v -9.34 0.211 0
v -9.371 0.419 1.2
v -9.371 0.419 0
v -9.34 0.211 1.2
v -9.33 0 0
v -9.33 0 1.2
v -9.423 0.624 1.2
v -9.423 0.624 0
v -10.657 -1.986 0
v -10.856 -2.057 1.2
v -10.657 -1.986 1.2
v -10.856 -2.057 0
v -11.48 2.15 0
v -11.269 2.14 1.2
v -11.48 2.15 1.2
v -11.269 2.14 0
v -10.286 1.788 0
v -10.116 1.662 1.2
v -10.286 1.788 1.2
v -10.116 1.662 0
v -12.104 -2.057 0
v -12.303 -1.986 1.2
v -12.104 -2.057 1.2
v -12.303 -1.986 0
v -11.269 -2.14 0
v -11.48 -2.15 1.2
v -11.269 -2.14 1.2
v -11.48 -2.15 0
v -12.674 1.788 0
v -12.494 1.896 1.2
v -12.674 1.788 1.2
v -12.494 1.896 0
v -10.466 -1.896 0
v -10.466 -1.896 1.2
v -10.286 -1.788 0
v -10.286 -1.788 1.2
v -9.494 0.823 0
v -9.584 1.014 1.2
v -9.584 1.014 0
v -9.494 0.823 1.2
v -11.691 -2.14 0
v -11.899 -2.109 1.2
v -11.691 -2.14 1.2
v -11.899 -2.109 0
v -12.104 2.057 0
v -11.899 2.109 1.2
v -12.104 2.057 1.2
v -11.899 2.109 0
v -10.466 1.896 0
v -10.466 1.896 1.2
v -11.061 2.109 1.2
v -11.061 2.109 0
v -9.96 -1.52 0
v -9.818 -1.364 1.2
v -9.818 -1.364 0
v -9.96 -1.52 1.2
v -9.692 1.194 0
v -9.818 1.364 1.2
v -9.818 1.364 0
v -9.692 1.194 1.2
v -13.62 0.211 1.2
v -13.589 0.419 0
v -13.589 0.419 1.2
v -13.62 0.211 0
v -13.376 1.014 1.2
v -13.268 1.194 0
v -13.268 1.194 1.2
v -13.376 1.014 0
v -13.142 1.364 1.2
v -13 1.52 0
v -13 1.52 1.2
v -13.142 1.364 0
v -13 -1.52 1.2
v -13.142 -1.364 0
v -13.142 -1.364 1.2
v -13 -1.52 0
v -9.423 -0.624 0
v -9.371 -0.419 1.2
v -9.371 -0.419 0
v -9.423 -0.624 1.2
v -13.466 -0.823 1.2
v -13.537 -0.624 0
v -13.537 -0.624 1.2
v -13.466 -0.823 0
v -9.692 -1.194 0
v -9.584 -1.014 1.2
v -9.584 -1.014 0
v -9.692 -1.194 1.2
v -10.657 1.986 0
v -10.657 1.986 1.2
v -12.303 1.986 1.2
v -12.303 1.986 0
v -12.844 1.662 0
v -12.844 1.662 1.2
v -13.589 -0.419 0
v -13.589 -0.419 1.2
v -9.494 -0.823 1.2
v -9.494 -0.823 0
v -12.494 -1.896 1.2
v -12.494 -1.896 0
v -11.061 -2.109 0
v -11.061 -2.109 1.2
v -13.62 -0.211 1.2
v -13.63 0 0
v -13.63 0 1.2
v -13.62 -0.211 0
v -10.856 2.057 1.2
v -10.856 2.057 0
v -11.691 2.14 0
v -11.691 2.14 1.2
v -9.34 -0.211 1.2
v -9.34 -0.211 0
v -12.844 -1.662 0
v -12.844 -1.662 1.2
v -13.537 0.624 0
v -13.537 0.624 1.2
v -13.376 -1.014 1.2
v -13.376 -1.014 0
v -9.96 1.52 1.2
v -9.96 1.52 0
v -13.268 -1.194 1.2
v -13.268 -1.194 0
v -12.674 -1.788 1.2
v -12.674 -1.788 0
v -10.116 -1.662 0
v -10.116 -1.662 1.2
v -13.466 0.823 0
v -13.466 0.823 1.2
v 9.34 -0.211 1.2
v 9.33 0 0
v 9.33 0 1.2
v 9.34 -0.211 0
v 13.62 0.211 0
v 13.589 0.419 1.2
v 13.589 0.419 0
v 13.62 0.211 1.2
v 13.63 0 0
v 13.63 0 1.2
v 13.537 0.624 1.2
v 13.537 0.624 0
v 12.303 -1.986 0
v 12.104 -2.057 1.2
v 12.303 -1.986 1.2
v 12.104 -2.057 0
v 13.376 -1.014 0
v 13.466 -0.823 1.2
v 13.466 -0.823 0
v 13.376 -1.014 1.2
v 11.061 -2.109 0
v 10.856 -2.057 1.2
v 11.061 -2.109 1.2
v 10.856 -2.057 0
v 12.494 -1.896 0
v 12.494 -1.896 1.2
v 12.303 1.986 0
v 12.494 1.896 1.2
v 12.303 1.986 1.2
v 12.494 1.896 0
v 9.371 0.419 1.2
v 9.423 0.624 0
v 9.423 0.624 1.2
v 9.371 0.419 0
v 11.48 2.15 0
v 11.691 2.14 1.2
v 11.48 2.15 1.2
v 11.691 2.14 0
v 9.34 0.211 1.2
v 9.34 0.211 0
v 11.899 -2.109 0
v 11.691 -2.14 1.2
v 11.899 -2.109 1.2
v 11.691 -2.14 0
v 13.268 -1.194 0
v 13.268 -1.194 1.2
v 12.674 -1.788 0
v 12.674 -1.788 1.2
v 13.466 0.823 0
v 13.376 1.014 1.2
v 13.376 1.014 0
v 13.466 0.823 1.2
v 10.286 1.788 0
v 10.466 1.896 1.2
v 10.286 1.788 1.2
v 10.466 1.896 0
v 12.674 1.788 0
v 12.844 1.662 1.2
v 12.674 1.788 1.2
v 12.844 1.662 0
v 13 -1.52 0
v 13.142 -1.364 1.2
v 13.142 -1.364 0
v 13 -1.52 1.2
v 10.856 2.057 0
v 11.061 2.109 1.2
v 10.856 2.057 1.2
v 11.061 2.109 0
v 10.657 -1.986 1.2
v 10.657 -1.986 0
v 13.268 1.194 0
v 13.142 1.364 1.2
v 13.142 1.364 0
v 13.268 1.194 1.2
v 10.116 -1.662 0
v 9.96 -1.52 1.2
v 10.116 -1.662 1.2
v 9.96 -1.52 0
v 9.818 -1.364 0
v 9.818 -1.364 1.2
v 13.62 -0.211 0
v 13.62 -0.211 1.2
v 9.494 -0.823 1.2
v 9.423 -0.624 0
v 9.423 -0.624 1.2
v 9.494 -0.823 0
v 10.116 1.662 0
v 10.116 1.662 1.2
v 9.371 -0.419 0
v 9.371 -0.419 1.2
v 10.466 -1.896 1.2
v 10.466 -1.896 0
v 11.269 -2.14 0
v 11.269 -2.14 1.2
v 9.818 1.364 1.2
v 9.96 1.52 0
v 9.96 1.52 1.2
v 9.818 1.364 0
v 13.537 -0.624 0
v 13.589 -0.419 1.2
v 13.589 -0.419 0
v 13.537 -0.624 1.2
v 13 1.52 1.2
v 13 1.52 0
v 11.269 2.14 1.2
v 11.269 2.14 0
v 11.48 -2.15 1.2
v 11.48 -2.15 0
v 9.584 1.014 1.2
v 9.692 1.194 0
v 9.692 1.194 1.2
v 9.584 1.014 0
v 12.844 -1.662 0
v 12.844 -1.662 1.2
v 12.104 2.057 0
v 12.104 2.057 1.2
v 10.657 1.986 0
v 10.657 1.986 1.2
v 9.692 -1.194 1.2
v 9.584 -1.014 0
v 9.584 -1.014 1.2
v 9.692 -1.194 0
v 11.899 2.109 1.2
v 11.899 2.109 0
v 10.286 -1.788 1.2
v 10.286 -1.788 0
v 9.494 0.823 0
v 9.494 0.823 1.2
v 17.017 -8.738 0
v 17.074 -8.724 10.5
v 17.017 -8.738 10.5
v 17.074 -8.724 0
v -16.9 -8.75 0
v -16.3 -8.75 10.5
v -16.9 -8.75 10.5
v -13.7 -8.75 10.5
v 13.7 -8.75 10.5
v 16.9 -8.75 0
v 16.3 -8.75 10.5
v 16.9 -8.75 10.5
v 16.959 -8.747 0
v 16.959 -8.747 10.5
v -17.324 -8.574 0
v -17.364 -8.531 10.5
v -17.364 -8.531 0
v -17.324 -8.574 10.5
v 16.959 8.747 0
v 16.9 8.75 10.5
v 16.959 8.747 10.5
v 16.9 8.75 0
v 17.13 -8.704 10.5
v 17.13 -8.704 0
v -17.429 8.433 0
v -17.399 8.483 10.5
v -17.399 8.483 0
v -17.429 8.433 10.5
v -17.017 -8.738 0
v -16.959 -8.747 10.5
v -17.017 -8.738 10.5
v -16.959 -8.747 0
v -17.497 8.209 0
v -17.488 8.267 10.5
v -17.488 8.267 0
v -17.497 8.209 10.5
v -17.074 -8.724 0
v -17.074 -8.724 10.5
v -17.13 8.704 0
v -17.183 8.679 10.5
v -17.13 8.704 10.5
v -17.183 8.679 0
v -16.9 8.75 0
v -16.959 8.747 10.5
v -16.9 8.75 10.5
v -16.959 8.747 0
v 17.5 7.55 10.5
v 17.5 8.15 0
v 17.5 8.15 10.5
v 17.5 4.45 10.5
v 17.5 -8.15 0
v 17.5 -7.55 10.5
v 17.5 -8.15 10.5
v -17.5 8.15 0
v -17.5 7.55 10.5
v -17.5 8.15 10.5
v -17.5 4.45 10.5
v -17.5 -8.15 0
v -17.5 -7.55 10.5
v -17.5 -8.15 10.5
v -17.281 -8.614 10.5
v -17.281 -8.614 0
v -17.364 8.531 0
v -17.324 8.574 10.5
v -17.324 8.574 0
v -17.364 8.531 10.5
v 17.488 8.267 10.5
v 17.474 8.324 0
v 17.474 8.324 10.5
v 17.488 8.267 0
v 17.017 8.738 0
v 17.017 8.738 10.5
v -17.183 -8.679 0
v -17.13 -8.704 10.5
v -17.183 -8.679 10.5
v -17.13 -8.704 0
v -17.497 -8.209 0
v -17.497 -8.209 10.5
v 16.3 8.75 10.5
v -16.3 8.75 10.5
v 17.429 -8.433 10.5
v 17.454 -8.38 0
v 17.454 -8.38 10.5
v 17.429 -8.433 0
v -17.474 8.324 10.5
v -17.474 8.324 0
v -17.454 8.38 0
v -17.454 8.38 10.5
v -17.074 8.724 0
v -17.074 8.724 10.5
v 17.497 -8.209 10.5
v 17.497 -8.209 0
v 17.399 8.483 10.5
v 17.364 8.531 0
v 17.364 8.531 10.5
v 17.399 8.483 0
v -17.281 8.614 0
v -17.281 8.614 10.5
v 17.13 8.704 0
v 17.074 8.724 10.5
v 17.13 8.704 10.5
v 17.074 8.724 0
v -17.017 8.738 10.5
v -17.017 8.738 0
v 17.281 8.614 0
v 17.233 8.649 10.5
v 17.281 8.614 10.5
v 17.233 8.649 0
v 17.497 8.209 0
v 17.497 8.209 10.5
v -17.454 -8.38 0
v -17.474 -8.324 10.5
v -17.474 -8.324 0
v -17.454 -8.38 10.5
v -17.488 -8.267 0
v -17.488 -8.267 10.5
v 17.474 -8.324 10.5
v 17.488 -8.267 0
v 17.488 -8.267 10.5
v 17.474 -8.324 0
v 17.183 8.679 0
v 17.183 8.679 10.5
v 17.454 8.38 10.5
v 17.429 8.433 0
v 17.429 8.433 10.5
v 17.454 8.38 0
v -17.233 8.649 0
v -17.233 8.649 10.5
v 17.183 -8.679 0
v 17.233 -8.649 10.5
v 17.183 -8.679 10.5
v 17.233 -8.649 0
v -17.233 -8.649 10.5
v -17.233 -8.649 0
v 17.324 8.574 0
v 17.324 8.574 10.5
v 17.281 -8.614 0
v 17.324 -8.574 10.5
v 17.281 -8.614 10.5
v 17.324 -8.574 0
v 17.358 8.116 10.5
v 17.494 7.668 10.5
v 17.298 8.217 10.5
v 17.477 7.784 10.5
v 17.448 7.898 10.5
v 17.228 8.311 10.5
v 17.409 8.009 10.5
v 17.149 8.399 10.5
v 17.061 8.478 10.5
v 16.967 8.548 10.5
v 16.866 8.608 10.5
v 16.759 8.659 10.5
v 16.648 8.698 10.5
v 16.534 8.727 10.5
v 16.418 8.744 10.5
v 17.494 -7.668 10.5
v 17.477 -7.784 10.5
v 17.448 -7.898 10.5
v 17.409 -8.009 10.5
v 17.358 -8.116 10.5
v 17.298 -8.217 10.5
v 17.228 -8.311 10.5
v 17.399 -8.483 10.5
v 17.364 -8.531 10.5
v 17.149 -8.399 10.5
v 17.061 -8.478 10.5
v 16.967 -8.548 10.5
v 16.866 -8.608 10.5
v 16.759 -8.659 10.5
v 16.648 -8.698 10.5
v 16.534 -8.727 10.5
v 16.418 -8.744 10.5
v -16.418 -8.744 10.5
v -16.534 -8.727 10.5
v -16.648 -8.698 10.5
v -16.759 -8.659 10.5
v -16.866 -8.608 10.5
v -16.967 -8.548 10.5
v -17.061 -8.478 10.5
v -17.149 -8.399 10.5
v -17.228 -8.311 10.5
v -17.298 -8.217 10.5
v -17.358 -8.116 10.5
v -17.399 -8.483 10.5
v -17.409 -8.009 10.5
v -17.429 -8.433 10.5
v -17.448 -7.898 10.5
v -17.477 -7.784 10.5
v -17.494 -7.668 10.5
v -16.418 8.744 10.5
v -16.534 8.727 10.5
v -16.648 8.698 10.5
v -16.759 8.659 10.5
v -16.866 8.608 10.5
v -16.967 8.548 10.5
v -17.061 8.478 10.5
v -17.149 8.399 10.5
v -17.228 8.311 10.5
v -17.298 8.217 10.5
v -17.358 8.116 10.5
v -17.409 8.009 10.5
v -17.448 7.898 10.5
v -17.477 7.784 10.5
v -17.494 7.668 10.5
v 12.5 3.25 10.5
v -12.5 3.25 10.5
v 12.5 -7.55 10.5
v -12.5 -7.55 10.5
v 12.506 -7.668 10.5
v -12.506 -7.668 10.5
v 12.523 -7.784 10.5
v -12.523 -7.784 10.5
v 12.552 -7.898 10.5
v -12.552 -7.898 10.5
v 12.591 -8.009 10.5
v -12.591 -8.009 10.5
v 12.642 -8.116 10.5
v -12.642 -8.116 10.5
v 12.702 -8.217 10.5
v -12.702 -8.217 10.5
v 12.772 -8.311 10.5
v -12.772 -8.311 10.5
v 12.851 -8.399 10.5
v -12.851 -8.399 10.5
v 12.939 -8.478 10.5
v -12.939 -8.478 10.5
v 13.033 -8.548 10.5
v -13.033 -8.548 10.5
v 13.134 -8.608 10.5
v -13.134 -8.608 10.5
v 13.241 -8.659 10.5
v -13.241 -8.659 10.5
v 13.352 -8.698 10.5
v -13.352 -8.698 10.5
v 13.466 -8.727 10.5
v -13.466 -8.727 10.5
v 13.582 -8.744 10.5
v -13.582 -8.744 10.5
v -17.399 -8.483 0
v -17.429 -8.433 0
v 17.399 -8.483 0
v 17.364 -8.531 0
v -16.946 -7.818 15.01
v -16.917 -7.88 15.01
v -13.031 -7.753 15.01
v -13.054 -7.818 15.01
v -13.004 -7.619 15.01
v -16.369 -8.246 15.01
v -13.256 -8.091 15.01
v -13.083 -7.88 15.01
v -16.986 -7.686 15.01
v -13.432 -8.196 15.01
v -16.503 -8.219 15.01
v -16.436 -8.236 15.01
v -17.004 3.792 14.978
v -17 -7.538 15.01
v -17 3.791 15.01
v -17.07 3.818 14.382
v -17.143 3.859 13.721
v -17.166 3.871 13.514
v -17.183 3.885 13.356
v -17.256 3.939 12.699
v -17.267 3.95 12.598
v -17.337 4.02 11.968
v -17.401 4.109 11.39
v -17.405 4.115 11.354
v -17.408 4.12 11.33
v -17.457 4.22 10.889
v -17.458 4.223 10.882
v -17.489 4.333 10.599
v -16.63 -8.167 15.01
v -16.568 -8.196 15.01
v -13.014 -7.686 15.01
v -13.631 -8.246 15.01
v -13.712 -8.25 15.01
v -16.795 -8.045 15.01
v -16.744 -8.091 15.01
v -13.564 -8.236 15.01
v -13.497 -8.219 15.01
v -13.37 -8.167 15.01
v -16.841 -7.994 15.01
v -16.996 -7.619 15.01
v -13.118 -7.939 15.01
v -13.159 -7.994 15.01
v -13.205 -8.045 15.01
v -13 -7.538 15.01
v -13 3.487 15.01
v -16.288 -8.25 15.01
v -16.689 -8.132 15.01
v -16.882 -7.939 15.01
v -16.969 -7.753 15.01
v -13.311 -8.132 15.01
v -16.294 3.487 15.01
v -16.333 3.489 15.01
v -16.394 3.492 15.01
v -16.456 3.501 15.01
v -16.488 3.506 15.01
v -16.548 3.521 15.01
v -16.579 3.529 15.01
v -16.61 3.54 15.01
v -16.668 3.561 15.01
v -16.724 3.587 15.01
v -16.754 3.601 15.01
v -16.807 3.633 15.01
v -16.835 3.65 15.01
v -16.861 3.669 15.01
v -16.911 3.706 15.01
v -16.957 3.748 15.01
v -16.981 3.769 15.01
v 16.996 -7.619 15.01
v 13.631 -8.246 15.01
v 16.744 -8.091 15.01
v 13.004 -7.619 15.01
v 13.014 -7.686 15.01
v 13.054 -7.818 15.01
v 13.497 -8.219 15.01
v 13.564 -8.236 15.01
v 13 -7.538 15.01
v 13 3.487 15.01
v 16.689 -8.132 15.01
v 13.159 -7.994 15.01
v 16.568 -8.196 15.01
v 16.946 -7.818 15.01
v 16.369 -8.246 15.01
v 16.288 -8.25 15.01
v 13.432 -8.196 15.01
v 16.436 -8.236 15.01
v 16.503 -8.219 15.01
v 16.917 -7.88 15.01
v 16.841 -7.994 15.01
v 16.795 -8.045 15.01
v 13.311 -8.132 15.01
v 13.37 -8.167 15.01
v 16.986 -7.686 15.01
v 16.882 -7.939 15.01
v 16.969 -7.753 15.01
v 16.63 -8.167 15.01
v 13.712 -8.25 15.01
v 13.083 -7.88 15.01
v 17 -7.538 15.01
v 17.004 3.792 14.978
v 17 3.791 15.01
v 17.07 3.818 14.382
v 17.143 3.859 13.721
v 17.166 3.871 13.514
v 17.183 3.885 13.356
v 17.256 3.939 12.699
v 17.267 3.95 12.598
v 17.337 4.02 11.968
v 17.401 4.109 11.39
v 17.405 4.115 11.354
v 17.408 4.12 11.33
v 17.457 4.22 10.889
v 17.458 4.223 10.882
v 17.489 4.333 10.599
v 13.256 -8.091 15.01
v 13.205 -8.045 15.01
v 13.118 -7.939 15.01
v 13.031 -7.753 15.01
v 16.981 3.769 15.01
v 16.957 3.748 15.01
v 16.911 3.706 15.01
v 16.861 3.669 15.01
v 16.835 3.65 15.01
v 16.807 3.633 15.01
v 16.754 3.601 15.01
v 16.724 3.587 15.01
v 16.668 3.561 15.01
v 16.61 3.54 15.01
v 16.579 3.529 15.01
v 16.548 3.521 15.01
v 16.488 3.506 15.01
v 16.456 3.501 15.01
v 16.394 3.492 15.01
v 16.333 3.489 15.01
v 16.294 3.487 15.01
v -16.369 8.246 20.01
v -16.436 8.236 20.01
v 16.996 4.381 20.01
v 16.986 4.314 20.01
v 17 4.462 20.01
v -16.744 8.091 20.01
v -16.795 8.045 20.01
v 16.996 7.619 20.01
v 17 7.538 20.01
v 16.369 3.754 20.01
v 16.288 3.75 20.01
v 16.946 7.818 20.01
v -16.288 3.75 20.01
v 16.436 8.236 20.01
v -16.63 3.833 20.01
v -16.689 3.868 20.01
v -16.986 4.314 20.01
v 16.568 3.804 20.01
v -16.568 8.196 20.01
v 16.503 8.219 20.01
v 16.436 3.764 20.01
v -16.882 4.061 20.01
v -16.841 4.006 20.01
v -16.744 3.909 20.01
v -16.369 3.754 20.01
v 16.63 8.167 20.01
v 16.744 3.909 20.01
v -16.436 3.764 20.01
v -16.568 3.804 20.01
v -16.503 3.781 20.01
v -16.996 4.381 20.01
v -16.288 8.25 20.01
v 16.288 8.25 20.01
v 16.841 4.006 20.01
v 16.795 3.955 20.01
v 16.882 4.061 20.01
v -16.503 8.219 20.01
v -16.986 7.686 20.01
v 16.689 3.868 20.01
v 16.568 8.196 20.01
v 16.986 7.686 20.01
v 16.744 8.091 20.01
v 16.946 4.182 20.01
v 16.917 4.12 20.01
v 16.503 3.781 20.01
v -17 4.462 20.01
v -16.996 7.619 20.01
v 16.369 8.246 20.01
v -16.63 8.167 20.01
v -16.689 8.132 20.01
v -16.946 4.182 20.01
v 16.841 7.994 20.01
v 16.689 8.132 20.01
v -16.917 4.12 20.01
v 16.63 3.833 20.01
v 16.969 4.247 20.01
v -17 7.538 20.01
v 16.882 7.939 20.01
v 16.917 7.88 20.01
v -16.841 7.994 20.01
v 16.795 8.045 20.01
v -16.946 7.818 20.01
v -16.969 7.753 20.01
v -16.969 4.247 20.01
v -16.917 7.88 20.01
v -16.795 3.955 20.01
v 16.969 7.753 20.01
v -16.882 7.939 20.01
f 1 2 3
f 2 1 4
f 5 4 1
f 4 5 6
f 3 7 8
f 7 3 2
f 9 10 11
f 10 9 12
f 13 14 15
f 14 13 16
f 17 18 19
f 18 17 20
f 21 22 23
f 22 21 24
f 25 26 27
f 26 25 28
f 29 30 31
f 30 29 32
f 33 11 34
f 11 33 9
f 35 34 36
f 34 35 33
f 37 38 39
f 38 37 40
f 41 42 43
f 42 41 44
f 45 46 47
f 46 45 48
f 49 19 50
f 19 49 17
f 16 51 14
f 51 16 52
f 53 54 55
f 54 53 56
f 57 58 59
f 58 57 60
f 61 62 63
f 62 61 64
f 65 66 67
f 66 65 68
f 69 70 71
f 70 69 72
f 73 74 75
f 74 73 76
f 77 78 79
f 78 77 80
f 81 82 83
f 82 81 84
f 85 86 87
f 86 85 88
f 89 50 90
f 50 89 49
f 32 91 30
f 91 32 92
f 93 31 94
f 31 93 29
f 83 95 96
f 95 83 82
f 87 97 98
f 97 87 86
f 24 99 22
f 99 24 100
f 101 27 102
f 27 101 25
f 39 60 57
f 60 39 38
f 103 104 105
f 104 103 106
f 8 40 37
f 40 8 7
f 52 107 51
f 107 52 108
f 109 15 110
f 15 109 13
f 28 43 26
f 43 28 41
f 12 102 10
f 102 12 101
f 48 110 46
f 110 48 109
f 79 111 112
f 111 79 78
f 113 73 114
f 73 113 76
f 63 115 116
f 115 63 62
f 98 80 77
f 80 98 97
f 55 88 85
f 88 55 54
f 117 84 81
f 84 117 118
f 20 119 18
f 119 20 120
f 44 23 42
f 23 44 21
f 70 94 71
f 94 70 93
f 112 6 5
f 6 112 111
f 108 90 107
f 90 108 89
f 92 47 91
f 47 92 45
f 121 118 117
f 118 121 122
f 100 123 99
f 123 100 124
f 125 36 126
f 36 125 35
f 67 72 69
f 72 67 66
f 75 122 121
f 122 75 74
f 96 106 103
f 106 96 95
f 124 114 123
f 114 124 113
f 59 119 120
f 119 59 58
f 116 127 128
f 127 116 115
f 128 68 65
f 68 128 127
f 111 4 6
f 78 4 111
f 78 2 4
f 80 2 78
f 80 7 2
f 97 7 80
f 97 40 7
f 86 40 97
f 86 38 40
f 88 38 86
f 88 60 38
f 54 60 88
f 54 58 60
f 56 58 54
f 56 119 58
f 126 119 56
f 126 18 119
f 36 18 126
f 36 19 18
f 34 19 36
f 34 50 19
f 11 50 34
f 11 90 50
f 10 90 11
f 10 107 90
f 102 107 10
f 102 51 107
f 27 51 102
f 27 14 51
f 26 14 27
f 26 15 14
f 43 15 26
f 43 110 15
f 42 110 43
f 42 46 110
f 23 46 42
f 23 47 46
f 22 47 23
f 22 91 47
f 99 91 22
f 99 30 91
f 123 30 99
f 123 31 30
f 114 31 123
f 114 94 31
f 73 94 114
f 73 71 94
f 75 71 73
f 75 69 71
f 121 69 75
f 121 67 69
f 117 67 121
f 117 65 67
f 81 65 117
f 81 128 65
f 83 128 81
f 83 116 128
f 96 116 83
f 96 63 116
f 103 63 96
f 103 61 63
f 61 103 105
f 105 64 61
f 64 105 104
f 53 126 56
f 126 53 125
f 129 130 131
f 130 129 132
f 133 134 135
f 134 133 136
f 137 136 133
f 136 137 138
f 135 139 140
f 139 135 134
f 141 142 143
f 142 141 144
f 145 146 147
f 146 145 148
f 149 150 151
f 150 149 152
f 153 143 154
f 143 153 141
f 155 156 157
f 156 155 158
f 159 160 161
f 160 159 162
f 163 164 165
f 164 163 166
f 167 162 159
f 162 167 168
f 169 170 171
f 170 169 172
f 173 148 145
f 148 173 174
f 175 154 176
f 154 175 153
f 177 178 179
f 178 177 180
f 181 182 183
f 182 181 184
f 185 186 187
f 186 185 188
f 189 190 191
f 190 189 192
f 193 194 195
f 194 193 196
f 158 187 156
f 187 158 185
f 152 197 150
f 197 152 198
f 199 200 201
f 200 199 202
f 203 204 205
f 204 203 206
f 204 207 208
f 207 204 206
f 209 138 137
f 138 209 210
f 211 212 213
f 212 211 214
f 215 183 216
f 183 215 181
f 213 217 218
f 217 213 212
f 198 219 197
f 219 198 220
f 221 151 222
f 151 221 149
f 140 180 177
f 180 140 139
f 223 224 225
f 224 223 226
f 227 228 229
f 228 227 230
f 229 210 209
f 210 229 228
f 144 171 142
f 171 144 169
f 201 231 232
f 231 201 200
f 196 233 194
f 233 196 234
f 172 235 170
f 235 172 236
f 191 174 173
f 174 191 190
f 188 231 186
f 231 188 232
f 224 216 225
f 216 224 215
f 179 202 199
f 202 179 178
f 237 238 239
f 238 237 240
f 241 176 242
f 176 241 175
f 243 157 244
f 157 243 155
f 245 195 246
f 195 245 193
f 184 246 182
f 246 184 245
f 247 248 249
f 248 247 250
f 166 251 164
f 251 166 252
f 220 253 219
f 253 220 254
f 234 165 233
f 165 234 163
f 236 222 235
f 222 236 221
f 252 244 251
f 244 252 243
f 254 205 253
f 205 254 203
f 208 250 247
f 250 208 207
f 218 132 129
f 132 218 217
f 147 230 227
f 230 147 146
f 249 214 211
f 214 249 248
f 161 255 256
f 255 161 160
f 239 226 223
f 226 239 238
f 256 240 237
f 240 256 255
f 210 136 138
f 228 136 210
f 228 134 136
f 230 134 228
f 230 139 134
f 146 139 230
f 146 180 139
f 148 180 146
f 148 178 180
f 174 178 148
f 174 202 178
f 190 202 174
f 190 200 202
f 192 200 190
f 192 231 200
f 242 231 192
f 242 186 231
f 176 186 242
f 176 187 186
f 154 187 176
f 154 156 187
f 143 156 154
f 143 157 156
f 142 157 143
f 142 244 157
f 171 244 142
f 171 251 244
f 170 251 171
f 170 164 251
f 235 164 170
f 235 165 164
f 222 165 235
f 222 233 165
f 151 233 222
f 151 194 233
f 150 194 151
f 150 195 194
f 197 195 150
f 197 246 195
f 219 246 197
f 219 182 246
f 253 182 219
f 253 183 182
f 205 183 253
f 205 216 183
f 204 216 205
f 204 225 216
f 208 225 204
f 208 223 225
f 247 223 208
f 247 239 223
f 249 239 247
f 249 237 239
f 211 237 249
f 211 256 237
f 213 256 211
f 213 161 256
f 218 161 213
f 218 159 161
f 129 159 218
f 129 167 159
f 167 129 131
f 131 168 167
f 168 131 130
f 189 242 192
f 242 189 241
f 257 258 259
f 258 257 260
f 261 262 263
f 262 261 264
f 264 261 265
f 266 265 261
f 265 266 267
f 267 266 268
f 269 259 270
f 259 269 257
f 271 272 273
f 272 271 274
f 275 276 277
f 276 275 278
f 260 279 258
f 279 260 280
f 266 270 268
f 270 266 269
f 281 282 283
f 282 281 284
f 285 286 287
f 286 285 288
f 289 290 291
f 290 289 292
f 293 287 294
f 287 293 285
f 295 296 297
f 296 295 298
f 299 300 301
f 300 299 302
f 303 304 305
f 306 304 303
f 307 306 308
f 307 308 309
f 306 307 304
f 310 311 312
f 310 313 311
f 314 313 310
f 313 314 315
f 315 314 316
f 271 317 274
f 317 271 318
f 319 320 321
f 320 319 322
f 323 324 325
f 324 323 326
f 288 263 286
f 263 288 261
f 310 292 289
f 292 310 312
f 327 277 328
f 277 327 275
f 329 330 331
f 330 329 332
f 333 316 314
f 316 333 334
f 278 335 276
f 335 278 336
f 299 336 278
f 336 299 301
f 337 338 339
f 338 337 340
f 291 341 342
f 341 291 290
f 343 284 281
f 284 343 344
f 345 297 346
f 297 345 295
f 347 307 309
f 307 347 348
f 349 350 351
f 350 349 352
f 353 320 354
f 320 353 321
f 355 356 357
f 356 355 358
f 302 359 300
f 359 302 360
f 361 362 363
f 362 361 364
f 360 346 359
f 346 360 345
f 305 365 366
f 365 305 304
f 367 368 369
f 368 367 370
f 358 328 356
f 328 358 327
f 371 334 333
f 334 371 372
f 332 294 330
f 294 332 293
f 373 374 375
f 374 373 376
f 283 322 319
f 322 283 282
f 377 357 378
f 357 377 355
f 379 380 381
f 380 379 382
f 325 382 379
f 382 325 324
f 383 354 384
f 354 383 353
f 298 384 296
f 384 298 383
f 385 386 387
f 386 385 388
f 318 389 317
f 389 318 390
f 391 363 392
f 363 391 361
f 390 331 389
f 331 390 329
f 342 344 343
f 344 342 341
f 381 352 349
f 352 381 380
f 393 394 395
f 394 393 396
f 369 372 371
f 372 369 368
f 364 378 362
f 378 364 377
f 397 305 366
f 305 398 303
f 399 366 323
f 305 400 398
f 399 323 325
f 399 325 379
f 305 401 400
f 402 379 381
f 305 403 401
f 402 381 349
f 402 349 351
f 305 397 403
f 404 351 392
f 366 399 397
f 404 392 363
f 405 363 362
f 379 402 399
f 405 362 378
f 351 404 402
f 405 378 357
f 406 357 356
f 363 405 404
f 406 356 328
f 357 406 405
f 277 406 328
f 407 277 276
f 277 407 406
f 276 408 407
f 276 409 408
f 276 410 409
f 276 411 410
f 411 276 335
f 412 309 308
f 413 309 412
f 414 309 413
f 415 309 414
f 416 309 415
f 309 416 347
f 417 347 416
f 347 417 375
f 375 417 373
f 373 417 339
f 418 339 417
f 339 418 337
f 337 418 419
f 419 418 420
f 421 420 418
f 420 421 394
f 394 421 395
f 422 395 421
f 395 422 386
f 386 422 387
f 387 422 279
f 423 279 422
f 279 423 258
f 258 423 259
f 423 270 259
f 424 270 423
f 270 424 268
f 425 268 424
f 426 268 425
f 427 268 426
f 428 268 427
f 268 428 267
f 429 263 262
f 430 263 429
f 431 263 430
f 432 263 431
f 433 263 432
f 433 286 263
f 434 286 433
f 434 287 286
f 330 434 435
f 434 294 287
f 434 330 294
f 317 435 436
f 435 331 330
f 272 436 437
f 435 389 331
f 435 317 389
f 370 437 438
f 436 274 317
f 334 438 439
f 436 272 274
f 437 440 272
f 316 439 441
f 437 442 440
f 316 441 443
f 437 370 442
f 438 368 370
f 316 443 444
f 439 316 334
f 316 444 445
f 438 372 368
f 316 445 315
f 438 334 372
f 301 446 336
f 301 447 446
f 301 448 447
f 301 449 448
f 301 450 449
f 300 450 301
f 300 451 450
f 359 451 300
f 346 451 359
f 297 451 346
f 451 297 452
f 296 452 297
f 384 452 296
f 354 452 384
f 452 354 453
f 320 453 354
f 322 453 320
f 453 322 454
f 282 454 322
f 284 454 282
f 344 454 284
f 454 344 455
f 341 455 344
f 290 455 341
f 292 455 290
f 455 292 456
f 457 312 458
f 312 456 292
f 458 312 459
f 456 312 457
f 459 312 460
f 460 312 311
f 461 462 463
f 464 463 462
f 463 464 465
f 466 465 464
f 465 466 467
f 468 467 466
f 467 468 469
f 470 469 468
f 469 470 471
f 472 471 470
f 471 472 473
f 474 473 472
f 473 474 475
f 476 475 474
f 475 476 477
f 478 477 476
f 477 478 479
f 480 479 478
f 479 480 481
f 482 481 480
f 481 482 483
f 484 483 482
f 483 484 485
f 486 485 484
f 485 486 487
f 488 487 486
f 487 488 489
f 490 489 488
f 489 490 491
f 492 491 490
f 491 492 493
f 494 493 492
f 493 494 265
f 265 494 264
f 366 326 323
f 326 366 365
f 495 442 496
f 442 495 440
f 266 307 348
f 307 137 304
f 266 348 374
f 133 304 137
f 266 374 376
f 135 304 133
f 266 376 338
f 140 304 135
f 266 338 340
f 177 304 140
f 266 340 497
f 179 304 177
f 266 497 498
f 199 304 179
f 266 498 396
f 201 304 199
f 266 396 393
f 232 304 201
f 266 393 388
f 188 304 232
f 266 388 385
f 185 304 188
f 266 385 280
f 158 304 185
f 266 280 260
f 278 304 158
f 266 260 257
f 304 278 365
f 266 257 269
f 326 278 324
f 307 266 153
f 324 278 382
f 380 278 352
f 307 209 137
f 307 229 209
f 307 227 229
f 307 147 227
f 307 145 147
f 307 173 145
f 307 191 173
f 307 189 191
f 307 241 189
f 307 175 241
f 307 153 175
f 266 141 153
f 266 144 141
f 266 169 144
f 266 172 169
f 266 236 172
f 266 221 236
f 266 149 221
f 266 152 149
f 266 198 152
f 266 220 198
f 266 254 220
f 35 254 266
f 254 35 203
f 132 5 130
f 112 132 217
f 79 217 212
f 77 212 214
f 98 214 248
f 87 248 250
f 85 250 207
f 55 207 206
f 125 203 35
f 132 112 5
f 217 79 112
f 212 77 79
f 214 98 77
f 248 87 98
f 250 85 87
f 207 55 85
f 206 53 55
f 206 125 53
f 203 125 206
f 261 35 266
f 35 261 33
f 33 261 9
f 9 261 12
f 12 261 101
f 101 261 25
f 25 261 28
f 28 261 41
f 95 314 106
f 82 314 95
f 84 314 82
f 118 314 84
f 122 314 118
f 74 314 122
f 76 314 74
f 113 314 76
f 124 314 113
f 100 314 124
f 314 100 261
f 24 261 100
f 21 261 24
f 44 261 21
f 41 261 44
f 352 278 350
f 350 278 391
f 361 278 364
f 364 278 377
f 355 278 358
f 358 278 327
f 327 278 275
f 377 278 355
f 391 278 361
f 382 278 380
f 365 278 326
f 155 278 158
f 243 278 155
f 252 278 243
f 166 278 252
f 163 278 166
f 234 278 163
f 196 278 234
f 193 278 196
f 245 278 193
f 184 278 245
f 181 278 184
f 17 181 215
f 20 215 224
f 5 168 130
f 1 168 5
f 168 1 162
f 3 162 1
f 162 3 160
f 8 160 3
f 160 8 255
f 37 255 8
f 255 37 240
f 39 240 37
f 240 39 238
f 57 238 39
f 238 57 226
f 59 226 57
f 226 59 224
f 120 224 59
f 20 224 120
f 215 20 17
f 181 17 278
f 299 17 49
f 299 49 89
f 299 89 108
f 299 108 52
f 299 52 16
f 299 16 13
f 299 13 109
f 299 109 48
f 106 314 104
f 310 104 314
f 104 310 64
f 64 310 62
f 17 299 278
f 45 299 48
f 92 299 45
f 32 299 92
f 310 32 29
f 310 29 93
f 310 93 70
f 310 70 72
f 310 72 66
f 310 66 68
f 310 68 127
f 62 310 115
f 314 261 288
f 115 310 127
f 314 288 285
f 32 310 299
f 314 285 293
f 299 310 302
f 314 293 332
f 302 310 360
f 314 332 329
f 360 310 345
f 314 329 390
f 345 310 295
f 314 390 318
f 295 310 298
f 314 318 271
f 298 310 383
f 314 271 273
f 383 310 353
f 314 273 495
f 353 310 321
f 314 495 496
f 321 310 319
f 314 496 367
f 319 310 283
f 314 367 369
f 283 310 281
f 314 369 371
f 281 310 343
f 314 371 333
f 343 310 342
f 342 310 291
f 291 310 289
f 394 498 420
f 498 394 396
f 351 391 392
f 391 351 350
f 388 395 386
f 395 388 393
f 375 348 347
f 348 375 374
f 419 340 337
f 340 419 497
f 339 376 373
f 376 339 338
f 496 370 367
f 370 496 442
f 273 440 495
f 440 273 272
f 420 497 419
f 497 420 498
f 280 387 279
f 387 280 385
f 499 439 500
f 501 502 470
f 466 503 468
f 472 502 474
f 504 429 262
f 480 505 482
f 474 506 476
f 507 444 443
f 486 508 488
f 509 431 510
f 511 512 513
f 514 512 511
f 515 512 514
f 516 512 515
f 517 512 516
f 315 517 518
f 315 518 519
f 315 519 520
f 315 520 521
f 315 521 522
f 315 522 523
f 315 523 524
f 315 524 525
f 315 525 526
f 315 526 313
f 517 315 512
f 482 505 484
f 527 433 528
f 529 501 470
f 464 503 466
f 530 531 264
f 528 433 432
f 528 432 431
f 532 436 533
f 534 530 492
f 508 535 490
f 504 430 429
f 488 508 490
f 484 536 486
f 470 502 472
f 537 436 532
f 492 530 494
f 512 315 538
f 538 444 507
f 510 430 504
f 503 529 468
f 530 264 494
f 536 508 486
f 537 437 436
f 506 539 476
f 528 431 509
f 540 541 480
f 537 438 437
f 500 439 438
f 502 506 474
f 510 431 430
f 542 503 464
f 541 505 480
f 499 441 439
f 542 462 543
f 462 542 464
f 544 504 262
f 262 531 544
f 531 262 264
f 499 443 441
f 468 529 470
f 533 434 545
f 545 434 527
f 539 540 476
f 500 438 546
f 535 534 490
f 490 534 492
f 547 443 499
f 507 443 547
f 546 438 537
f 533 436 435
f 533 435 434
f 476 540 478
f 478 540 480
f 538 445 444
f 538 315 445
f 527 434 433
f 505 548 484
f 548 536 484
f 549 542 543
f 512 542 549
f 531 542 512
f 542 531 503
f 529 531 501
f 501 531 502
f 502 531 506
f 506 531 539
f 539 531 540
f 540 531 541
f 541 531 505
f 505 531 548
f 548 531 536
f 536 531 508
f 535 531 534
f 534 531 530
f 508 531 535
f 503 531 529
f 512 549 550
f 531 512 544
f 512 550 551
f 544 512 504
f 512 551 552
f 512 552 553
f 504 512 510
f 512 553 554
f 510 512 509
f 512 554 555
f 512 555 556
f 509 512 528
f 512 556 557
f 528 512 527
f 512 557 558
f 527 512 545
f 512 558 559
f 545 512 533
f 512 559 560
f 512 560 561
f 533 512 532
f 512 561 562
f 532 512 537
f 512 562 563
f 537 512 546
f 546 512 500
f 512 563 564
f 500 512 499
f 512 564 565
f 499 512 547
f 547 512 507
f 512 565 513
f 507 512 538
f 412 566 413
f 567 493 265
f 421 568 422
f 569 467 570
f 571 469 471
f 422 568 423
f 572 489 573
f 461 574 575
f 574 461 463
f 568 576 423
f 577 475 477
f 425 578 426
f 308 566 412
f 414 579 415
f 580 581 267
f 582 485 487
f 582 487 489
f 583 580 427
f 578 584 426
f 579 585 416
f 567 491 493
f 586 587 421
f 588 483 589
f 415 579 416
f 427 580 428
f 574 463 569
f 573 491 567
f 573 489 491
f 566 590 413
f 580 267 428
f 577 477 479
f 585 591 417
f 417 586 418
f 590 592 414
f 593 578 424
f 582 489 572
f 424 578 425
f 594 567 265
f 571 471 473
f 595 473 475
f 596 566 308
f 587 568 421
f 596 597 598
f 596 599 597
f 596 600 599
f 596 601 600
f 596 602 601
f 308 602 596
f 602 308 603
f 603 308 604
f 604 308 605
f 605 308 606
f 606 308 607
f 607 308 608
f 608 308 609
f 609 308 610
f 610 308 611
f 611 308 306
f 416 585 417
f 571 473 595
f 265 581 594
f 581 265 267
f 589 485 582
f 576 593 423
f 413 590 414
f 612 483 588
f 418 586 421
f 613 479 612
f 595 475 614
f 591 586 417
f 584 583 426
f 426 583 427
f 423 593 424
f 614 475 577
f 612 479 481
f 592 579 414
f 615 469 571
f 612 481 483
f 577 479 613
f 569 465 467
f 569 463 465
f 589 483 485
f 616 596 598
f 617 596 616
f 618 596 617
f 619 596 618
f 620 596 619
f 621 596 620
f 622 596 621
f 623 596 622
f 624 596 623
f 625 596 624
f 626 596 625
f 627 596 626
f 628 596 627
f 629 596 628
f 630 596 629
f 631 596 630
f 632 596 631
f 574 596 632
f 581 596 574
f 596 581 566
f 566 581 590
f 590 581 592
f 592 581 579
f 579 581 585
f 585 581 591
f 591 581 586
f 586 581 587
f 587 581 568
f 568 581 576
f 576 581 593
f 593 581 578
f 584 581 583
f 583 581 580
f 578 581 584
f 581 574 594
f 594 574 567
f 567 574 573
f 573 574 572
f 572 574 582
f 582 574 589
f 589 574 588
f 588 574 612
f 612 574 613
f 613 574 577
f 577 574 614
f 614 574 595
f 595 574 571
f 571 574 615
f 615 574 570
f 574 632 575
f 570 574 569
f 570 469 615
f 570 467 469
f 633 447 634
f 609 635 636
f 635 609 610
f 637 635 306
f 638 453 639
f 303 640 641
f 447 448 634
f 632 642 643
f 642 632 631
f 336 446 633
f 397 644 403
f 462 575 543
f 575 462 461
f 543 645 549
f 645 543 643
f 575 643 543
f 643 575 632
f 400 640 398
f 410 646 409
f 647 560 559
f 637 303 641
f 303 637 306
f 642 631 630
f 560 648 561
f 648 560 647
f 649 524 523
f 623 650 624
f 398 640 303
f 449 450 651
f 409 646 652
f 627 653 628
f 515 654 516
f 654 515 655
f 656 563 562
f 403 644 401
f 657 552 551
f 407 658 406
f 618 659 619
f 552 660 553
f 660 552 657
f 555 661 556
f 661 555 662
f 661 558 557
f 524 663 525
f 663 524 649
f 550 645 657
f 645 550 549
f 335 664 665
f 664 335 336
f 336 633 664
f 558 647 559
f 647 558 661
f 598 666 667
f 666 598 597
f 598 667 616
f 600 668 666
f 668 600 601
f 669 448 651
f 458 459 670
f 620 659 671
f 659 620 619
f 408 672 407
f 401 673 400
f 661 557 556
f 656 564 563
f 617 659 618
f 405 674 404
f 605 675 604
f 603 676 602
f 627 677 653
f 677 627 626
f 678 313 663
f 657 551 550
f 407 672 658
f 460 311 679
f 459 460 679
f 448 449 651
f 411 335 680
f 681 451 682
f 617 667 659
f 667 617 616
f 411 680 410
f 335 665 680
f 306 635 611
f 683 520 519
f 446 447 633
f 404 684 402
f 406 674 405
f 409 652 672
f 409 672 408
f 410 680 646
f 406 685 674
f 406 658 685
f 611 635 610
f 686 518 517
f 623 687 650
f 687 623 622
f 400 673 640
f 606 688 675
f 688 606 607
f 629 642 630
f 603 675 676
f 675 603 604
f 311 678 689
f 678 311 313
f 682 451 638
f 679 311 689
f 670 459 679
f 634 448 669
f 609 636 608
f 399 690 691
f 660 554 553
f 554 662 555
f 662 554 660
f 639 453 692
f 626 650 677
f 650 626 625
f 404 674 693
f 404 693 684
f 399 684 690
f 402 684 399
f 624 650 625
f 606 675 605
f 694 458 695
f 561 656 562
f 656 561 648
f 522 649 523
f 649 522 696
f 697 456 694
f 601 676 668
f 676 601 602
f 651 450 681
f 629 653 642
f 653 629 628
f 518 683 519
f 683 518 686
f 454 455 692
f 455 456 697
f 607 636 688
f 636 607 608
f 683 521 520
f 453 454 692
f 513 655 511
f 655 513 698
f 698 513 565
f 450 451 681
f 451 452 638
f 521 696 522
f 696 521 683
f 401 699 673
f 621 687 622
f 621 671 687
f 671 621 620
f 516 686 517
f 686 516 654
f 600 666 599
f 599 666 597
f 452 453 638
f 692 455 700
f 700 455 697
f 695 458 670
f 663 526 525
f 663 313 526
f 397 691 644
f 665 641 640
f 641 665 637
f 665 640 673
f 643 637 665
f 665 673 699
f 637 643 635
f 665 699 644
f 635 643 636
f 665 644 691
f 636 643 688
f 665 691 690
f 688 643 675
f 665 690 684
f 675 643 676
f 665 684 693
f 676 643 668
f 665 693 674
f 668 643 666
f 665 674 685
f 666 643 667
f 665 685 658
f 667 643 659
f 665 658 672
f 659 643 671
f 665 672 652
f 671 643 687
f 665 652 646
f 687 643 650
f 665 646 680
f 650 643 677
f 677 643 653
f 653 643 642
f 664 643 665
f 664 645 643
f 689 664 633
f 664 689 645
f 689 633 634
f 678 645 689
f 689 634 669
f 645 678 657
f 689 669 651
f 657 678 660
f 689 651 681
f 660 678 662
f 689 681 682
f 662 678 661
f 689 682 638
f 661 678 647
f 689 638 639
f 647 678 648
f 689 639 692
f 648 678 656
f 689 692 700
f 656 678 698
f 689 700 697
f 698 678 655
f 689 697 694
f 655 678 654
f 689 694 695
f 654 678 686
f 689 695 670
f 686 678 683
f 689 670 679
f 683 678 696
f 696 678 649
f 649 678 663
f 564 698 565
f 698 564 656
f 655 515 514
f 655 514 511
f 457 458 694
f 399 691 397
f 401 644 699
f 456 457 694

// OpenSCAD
// outdoor / sofa — a garden couch token: the outdoor sibling of the living-room
// sofa (scad/livingroom/sofa.scad), with the same raised back cushion running
// the full width along the rear edge and an arm cushion down each short side.
//
// Width/Depth are the real-world footprint in cm — a 2-seat garden couch/bench.
// The heights are real cm, exactly as on the indoor sofa: Height is the top of the
// back, Arm the top of the arms and Seat the seat they rise from. The block is the
// seat (see printed_h() / rise() in lib/common.scad).

include <../lib/common.scad>

Width  = 140;  // cm — a 2-seat garden couch
Depth  = 70;   // cm
Height = 80;   // cm — top of the back cushion
Arm    = 60;   // cm — top of the arms
Seat   = 42;   // cm — seat height

// printed mm: the seat block the cushions stand on, and how far (cm) the back and
// the arms rise off it
Seat_z = printed_h(Seat);
Pad_h  = Height - Seat;
Arm_h  = Arm - Seat;

Show_cushions = true;
// Back and arm cushions, in real-world cm — unlike the armchair's, these run
// edge to edge: the back spans the full width and each arm the full depth, so
// the pads read as one wraparound seat back rather than three separate
// pillows, exactly as on the indoor sofa.
Back_d = 22;  // back cushion depth (front-to-back)
Arm_w  = 20;  // arm cushion width (side-to-side)

// Magnet pockets in the bottom face, in a row along the width (0 = none). Two
// keep the piece from pivoting on the board; see Magnet_* in lib/common.scad.
Magnets = 2;

sofa();

module sofa() {
    union() {
        difference() {
            footprint(Width, Depth, Seat_z);
            if (Magnets > 0)
                magnets(Width, Depth, Magnets);
        }
        if (Show_cushions) {
            // back cushion: full width, along the rear edge
            translate([0, cm(Depth / 2 - Back_d / 2), 0])
                cushion(Width, Back_d, Seat_z, Pad_h);
            // an arm cushion down each side, running the full depth
            for (s = [-1, 1])
                translate([s * cm(Width / 2 - Arm_w / 2), 0, 0])
                    cushion(Arm_w, Depth, Seat_z, Arm_h);
        }
    }
}
